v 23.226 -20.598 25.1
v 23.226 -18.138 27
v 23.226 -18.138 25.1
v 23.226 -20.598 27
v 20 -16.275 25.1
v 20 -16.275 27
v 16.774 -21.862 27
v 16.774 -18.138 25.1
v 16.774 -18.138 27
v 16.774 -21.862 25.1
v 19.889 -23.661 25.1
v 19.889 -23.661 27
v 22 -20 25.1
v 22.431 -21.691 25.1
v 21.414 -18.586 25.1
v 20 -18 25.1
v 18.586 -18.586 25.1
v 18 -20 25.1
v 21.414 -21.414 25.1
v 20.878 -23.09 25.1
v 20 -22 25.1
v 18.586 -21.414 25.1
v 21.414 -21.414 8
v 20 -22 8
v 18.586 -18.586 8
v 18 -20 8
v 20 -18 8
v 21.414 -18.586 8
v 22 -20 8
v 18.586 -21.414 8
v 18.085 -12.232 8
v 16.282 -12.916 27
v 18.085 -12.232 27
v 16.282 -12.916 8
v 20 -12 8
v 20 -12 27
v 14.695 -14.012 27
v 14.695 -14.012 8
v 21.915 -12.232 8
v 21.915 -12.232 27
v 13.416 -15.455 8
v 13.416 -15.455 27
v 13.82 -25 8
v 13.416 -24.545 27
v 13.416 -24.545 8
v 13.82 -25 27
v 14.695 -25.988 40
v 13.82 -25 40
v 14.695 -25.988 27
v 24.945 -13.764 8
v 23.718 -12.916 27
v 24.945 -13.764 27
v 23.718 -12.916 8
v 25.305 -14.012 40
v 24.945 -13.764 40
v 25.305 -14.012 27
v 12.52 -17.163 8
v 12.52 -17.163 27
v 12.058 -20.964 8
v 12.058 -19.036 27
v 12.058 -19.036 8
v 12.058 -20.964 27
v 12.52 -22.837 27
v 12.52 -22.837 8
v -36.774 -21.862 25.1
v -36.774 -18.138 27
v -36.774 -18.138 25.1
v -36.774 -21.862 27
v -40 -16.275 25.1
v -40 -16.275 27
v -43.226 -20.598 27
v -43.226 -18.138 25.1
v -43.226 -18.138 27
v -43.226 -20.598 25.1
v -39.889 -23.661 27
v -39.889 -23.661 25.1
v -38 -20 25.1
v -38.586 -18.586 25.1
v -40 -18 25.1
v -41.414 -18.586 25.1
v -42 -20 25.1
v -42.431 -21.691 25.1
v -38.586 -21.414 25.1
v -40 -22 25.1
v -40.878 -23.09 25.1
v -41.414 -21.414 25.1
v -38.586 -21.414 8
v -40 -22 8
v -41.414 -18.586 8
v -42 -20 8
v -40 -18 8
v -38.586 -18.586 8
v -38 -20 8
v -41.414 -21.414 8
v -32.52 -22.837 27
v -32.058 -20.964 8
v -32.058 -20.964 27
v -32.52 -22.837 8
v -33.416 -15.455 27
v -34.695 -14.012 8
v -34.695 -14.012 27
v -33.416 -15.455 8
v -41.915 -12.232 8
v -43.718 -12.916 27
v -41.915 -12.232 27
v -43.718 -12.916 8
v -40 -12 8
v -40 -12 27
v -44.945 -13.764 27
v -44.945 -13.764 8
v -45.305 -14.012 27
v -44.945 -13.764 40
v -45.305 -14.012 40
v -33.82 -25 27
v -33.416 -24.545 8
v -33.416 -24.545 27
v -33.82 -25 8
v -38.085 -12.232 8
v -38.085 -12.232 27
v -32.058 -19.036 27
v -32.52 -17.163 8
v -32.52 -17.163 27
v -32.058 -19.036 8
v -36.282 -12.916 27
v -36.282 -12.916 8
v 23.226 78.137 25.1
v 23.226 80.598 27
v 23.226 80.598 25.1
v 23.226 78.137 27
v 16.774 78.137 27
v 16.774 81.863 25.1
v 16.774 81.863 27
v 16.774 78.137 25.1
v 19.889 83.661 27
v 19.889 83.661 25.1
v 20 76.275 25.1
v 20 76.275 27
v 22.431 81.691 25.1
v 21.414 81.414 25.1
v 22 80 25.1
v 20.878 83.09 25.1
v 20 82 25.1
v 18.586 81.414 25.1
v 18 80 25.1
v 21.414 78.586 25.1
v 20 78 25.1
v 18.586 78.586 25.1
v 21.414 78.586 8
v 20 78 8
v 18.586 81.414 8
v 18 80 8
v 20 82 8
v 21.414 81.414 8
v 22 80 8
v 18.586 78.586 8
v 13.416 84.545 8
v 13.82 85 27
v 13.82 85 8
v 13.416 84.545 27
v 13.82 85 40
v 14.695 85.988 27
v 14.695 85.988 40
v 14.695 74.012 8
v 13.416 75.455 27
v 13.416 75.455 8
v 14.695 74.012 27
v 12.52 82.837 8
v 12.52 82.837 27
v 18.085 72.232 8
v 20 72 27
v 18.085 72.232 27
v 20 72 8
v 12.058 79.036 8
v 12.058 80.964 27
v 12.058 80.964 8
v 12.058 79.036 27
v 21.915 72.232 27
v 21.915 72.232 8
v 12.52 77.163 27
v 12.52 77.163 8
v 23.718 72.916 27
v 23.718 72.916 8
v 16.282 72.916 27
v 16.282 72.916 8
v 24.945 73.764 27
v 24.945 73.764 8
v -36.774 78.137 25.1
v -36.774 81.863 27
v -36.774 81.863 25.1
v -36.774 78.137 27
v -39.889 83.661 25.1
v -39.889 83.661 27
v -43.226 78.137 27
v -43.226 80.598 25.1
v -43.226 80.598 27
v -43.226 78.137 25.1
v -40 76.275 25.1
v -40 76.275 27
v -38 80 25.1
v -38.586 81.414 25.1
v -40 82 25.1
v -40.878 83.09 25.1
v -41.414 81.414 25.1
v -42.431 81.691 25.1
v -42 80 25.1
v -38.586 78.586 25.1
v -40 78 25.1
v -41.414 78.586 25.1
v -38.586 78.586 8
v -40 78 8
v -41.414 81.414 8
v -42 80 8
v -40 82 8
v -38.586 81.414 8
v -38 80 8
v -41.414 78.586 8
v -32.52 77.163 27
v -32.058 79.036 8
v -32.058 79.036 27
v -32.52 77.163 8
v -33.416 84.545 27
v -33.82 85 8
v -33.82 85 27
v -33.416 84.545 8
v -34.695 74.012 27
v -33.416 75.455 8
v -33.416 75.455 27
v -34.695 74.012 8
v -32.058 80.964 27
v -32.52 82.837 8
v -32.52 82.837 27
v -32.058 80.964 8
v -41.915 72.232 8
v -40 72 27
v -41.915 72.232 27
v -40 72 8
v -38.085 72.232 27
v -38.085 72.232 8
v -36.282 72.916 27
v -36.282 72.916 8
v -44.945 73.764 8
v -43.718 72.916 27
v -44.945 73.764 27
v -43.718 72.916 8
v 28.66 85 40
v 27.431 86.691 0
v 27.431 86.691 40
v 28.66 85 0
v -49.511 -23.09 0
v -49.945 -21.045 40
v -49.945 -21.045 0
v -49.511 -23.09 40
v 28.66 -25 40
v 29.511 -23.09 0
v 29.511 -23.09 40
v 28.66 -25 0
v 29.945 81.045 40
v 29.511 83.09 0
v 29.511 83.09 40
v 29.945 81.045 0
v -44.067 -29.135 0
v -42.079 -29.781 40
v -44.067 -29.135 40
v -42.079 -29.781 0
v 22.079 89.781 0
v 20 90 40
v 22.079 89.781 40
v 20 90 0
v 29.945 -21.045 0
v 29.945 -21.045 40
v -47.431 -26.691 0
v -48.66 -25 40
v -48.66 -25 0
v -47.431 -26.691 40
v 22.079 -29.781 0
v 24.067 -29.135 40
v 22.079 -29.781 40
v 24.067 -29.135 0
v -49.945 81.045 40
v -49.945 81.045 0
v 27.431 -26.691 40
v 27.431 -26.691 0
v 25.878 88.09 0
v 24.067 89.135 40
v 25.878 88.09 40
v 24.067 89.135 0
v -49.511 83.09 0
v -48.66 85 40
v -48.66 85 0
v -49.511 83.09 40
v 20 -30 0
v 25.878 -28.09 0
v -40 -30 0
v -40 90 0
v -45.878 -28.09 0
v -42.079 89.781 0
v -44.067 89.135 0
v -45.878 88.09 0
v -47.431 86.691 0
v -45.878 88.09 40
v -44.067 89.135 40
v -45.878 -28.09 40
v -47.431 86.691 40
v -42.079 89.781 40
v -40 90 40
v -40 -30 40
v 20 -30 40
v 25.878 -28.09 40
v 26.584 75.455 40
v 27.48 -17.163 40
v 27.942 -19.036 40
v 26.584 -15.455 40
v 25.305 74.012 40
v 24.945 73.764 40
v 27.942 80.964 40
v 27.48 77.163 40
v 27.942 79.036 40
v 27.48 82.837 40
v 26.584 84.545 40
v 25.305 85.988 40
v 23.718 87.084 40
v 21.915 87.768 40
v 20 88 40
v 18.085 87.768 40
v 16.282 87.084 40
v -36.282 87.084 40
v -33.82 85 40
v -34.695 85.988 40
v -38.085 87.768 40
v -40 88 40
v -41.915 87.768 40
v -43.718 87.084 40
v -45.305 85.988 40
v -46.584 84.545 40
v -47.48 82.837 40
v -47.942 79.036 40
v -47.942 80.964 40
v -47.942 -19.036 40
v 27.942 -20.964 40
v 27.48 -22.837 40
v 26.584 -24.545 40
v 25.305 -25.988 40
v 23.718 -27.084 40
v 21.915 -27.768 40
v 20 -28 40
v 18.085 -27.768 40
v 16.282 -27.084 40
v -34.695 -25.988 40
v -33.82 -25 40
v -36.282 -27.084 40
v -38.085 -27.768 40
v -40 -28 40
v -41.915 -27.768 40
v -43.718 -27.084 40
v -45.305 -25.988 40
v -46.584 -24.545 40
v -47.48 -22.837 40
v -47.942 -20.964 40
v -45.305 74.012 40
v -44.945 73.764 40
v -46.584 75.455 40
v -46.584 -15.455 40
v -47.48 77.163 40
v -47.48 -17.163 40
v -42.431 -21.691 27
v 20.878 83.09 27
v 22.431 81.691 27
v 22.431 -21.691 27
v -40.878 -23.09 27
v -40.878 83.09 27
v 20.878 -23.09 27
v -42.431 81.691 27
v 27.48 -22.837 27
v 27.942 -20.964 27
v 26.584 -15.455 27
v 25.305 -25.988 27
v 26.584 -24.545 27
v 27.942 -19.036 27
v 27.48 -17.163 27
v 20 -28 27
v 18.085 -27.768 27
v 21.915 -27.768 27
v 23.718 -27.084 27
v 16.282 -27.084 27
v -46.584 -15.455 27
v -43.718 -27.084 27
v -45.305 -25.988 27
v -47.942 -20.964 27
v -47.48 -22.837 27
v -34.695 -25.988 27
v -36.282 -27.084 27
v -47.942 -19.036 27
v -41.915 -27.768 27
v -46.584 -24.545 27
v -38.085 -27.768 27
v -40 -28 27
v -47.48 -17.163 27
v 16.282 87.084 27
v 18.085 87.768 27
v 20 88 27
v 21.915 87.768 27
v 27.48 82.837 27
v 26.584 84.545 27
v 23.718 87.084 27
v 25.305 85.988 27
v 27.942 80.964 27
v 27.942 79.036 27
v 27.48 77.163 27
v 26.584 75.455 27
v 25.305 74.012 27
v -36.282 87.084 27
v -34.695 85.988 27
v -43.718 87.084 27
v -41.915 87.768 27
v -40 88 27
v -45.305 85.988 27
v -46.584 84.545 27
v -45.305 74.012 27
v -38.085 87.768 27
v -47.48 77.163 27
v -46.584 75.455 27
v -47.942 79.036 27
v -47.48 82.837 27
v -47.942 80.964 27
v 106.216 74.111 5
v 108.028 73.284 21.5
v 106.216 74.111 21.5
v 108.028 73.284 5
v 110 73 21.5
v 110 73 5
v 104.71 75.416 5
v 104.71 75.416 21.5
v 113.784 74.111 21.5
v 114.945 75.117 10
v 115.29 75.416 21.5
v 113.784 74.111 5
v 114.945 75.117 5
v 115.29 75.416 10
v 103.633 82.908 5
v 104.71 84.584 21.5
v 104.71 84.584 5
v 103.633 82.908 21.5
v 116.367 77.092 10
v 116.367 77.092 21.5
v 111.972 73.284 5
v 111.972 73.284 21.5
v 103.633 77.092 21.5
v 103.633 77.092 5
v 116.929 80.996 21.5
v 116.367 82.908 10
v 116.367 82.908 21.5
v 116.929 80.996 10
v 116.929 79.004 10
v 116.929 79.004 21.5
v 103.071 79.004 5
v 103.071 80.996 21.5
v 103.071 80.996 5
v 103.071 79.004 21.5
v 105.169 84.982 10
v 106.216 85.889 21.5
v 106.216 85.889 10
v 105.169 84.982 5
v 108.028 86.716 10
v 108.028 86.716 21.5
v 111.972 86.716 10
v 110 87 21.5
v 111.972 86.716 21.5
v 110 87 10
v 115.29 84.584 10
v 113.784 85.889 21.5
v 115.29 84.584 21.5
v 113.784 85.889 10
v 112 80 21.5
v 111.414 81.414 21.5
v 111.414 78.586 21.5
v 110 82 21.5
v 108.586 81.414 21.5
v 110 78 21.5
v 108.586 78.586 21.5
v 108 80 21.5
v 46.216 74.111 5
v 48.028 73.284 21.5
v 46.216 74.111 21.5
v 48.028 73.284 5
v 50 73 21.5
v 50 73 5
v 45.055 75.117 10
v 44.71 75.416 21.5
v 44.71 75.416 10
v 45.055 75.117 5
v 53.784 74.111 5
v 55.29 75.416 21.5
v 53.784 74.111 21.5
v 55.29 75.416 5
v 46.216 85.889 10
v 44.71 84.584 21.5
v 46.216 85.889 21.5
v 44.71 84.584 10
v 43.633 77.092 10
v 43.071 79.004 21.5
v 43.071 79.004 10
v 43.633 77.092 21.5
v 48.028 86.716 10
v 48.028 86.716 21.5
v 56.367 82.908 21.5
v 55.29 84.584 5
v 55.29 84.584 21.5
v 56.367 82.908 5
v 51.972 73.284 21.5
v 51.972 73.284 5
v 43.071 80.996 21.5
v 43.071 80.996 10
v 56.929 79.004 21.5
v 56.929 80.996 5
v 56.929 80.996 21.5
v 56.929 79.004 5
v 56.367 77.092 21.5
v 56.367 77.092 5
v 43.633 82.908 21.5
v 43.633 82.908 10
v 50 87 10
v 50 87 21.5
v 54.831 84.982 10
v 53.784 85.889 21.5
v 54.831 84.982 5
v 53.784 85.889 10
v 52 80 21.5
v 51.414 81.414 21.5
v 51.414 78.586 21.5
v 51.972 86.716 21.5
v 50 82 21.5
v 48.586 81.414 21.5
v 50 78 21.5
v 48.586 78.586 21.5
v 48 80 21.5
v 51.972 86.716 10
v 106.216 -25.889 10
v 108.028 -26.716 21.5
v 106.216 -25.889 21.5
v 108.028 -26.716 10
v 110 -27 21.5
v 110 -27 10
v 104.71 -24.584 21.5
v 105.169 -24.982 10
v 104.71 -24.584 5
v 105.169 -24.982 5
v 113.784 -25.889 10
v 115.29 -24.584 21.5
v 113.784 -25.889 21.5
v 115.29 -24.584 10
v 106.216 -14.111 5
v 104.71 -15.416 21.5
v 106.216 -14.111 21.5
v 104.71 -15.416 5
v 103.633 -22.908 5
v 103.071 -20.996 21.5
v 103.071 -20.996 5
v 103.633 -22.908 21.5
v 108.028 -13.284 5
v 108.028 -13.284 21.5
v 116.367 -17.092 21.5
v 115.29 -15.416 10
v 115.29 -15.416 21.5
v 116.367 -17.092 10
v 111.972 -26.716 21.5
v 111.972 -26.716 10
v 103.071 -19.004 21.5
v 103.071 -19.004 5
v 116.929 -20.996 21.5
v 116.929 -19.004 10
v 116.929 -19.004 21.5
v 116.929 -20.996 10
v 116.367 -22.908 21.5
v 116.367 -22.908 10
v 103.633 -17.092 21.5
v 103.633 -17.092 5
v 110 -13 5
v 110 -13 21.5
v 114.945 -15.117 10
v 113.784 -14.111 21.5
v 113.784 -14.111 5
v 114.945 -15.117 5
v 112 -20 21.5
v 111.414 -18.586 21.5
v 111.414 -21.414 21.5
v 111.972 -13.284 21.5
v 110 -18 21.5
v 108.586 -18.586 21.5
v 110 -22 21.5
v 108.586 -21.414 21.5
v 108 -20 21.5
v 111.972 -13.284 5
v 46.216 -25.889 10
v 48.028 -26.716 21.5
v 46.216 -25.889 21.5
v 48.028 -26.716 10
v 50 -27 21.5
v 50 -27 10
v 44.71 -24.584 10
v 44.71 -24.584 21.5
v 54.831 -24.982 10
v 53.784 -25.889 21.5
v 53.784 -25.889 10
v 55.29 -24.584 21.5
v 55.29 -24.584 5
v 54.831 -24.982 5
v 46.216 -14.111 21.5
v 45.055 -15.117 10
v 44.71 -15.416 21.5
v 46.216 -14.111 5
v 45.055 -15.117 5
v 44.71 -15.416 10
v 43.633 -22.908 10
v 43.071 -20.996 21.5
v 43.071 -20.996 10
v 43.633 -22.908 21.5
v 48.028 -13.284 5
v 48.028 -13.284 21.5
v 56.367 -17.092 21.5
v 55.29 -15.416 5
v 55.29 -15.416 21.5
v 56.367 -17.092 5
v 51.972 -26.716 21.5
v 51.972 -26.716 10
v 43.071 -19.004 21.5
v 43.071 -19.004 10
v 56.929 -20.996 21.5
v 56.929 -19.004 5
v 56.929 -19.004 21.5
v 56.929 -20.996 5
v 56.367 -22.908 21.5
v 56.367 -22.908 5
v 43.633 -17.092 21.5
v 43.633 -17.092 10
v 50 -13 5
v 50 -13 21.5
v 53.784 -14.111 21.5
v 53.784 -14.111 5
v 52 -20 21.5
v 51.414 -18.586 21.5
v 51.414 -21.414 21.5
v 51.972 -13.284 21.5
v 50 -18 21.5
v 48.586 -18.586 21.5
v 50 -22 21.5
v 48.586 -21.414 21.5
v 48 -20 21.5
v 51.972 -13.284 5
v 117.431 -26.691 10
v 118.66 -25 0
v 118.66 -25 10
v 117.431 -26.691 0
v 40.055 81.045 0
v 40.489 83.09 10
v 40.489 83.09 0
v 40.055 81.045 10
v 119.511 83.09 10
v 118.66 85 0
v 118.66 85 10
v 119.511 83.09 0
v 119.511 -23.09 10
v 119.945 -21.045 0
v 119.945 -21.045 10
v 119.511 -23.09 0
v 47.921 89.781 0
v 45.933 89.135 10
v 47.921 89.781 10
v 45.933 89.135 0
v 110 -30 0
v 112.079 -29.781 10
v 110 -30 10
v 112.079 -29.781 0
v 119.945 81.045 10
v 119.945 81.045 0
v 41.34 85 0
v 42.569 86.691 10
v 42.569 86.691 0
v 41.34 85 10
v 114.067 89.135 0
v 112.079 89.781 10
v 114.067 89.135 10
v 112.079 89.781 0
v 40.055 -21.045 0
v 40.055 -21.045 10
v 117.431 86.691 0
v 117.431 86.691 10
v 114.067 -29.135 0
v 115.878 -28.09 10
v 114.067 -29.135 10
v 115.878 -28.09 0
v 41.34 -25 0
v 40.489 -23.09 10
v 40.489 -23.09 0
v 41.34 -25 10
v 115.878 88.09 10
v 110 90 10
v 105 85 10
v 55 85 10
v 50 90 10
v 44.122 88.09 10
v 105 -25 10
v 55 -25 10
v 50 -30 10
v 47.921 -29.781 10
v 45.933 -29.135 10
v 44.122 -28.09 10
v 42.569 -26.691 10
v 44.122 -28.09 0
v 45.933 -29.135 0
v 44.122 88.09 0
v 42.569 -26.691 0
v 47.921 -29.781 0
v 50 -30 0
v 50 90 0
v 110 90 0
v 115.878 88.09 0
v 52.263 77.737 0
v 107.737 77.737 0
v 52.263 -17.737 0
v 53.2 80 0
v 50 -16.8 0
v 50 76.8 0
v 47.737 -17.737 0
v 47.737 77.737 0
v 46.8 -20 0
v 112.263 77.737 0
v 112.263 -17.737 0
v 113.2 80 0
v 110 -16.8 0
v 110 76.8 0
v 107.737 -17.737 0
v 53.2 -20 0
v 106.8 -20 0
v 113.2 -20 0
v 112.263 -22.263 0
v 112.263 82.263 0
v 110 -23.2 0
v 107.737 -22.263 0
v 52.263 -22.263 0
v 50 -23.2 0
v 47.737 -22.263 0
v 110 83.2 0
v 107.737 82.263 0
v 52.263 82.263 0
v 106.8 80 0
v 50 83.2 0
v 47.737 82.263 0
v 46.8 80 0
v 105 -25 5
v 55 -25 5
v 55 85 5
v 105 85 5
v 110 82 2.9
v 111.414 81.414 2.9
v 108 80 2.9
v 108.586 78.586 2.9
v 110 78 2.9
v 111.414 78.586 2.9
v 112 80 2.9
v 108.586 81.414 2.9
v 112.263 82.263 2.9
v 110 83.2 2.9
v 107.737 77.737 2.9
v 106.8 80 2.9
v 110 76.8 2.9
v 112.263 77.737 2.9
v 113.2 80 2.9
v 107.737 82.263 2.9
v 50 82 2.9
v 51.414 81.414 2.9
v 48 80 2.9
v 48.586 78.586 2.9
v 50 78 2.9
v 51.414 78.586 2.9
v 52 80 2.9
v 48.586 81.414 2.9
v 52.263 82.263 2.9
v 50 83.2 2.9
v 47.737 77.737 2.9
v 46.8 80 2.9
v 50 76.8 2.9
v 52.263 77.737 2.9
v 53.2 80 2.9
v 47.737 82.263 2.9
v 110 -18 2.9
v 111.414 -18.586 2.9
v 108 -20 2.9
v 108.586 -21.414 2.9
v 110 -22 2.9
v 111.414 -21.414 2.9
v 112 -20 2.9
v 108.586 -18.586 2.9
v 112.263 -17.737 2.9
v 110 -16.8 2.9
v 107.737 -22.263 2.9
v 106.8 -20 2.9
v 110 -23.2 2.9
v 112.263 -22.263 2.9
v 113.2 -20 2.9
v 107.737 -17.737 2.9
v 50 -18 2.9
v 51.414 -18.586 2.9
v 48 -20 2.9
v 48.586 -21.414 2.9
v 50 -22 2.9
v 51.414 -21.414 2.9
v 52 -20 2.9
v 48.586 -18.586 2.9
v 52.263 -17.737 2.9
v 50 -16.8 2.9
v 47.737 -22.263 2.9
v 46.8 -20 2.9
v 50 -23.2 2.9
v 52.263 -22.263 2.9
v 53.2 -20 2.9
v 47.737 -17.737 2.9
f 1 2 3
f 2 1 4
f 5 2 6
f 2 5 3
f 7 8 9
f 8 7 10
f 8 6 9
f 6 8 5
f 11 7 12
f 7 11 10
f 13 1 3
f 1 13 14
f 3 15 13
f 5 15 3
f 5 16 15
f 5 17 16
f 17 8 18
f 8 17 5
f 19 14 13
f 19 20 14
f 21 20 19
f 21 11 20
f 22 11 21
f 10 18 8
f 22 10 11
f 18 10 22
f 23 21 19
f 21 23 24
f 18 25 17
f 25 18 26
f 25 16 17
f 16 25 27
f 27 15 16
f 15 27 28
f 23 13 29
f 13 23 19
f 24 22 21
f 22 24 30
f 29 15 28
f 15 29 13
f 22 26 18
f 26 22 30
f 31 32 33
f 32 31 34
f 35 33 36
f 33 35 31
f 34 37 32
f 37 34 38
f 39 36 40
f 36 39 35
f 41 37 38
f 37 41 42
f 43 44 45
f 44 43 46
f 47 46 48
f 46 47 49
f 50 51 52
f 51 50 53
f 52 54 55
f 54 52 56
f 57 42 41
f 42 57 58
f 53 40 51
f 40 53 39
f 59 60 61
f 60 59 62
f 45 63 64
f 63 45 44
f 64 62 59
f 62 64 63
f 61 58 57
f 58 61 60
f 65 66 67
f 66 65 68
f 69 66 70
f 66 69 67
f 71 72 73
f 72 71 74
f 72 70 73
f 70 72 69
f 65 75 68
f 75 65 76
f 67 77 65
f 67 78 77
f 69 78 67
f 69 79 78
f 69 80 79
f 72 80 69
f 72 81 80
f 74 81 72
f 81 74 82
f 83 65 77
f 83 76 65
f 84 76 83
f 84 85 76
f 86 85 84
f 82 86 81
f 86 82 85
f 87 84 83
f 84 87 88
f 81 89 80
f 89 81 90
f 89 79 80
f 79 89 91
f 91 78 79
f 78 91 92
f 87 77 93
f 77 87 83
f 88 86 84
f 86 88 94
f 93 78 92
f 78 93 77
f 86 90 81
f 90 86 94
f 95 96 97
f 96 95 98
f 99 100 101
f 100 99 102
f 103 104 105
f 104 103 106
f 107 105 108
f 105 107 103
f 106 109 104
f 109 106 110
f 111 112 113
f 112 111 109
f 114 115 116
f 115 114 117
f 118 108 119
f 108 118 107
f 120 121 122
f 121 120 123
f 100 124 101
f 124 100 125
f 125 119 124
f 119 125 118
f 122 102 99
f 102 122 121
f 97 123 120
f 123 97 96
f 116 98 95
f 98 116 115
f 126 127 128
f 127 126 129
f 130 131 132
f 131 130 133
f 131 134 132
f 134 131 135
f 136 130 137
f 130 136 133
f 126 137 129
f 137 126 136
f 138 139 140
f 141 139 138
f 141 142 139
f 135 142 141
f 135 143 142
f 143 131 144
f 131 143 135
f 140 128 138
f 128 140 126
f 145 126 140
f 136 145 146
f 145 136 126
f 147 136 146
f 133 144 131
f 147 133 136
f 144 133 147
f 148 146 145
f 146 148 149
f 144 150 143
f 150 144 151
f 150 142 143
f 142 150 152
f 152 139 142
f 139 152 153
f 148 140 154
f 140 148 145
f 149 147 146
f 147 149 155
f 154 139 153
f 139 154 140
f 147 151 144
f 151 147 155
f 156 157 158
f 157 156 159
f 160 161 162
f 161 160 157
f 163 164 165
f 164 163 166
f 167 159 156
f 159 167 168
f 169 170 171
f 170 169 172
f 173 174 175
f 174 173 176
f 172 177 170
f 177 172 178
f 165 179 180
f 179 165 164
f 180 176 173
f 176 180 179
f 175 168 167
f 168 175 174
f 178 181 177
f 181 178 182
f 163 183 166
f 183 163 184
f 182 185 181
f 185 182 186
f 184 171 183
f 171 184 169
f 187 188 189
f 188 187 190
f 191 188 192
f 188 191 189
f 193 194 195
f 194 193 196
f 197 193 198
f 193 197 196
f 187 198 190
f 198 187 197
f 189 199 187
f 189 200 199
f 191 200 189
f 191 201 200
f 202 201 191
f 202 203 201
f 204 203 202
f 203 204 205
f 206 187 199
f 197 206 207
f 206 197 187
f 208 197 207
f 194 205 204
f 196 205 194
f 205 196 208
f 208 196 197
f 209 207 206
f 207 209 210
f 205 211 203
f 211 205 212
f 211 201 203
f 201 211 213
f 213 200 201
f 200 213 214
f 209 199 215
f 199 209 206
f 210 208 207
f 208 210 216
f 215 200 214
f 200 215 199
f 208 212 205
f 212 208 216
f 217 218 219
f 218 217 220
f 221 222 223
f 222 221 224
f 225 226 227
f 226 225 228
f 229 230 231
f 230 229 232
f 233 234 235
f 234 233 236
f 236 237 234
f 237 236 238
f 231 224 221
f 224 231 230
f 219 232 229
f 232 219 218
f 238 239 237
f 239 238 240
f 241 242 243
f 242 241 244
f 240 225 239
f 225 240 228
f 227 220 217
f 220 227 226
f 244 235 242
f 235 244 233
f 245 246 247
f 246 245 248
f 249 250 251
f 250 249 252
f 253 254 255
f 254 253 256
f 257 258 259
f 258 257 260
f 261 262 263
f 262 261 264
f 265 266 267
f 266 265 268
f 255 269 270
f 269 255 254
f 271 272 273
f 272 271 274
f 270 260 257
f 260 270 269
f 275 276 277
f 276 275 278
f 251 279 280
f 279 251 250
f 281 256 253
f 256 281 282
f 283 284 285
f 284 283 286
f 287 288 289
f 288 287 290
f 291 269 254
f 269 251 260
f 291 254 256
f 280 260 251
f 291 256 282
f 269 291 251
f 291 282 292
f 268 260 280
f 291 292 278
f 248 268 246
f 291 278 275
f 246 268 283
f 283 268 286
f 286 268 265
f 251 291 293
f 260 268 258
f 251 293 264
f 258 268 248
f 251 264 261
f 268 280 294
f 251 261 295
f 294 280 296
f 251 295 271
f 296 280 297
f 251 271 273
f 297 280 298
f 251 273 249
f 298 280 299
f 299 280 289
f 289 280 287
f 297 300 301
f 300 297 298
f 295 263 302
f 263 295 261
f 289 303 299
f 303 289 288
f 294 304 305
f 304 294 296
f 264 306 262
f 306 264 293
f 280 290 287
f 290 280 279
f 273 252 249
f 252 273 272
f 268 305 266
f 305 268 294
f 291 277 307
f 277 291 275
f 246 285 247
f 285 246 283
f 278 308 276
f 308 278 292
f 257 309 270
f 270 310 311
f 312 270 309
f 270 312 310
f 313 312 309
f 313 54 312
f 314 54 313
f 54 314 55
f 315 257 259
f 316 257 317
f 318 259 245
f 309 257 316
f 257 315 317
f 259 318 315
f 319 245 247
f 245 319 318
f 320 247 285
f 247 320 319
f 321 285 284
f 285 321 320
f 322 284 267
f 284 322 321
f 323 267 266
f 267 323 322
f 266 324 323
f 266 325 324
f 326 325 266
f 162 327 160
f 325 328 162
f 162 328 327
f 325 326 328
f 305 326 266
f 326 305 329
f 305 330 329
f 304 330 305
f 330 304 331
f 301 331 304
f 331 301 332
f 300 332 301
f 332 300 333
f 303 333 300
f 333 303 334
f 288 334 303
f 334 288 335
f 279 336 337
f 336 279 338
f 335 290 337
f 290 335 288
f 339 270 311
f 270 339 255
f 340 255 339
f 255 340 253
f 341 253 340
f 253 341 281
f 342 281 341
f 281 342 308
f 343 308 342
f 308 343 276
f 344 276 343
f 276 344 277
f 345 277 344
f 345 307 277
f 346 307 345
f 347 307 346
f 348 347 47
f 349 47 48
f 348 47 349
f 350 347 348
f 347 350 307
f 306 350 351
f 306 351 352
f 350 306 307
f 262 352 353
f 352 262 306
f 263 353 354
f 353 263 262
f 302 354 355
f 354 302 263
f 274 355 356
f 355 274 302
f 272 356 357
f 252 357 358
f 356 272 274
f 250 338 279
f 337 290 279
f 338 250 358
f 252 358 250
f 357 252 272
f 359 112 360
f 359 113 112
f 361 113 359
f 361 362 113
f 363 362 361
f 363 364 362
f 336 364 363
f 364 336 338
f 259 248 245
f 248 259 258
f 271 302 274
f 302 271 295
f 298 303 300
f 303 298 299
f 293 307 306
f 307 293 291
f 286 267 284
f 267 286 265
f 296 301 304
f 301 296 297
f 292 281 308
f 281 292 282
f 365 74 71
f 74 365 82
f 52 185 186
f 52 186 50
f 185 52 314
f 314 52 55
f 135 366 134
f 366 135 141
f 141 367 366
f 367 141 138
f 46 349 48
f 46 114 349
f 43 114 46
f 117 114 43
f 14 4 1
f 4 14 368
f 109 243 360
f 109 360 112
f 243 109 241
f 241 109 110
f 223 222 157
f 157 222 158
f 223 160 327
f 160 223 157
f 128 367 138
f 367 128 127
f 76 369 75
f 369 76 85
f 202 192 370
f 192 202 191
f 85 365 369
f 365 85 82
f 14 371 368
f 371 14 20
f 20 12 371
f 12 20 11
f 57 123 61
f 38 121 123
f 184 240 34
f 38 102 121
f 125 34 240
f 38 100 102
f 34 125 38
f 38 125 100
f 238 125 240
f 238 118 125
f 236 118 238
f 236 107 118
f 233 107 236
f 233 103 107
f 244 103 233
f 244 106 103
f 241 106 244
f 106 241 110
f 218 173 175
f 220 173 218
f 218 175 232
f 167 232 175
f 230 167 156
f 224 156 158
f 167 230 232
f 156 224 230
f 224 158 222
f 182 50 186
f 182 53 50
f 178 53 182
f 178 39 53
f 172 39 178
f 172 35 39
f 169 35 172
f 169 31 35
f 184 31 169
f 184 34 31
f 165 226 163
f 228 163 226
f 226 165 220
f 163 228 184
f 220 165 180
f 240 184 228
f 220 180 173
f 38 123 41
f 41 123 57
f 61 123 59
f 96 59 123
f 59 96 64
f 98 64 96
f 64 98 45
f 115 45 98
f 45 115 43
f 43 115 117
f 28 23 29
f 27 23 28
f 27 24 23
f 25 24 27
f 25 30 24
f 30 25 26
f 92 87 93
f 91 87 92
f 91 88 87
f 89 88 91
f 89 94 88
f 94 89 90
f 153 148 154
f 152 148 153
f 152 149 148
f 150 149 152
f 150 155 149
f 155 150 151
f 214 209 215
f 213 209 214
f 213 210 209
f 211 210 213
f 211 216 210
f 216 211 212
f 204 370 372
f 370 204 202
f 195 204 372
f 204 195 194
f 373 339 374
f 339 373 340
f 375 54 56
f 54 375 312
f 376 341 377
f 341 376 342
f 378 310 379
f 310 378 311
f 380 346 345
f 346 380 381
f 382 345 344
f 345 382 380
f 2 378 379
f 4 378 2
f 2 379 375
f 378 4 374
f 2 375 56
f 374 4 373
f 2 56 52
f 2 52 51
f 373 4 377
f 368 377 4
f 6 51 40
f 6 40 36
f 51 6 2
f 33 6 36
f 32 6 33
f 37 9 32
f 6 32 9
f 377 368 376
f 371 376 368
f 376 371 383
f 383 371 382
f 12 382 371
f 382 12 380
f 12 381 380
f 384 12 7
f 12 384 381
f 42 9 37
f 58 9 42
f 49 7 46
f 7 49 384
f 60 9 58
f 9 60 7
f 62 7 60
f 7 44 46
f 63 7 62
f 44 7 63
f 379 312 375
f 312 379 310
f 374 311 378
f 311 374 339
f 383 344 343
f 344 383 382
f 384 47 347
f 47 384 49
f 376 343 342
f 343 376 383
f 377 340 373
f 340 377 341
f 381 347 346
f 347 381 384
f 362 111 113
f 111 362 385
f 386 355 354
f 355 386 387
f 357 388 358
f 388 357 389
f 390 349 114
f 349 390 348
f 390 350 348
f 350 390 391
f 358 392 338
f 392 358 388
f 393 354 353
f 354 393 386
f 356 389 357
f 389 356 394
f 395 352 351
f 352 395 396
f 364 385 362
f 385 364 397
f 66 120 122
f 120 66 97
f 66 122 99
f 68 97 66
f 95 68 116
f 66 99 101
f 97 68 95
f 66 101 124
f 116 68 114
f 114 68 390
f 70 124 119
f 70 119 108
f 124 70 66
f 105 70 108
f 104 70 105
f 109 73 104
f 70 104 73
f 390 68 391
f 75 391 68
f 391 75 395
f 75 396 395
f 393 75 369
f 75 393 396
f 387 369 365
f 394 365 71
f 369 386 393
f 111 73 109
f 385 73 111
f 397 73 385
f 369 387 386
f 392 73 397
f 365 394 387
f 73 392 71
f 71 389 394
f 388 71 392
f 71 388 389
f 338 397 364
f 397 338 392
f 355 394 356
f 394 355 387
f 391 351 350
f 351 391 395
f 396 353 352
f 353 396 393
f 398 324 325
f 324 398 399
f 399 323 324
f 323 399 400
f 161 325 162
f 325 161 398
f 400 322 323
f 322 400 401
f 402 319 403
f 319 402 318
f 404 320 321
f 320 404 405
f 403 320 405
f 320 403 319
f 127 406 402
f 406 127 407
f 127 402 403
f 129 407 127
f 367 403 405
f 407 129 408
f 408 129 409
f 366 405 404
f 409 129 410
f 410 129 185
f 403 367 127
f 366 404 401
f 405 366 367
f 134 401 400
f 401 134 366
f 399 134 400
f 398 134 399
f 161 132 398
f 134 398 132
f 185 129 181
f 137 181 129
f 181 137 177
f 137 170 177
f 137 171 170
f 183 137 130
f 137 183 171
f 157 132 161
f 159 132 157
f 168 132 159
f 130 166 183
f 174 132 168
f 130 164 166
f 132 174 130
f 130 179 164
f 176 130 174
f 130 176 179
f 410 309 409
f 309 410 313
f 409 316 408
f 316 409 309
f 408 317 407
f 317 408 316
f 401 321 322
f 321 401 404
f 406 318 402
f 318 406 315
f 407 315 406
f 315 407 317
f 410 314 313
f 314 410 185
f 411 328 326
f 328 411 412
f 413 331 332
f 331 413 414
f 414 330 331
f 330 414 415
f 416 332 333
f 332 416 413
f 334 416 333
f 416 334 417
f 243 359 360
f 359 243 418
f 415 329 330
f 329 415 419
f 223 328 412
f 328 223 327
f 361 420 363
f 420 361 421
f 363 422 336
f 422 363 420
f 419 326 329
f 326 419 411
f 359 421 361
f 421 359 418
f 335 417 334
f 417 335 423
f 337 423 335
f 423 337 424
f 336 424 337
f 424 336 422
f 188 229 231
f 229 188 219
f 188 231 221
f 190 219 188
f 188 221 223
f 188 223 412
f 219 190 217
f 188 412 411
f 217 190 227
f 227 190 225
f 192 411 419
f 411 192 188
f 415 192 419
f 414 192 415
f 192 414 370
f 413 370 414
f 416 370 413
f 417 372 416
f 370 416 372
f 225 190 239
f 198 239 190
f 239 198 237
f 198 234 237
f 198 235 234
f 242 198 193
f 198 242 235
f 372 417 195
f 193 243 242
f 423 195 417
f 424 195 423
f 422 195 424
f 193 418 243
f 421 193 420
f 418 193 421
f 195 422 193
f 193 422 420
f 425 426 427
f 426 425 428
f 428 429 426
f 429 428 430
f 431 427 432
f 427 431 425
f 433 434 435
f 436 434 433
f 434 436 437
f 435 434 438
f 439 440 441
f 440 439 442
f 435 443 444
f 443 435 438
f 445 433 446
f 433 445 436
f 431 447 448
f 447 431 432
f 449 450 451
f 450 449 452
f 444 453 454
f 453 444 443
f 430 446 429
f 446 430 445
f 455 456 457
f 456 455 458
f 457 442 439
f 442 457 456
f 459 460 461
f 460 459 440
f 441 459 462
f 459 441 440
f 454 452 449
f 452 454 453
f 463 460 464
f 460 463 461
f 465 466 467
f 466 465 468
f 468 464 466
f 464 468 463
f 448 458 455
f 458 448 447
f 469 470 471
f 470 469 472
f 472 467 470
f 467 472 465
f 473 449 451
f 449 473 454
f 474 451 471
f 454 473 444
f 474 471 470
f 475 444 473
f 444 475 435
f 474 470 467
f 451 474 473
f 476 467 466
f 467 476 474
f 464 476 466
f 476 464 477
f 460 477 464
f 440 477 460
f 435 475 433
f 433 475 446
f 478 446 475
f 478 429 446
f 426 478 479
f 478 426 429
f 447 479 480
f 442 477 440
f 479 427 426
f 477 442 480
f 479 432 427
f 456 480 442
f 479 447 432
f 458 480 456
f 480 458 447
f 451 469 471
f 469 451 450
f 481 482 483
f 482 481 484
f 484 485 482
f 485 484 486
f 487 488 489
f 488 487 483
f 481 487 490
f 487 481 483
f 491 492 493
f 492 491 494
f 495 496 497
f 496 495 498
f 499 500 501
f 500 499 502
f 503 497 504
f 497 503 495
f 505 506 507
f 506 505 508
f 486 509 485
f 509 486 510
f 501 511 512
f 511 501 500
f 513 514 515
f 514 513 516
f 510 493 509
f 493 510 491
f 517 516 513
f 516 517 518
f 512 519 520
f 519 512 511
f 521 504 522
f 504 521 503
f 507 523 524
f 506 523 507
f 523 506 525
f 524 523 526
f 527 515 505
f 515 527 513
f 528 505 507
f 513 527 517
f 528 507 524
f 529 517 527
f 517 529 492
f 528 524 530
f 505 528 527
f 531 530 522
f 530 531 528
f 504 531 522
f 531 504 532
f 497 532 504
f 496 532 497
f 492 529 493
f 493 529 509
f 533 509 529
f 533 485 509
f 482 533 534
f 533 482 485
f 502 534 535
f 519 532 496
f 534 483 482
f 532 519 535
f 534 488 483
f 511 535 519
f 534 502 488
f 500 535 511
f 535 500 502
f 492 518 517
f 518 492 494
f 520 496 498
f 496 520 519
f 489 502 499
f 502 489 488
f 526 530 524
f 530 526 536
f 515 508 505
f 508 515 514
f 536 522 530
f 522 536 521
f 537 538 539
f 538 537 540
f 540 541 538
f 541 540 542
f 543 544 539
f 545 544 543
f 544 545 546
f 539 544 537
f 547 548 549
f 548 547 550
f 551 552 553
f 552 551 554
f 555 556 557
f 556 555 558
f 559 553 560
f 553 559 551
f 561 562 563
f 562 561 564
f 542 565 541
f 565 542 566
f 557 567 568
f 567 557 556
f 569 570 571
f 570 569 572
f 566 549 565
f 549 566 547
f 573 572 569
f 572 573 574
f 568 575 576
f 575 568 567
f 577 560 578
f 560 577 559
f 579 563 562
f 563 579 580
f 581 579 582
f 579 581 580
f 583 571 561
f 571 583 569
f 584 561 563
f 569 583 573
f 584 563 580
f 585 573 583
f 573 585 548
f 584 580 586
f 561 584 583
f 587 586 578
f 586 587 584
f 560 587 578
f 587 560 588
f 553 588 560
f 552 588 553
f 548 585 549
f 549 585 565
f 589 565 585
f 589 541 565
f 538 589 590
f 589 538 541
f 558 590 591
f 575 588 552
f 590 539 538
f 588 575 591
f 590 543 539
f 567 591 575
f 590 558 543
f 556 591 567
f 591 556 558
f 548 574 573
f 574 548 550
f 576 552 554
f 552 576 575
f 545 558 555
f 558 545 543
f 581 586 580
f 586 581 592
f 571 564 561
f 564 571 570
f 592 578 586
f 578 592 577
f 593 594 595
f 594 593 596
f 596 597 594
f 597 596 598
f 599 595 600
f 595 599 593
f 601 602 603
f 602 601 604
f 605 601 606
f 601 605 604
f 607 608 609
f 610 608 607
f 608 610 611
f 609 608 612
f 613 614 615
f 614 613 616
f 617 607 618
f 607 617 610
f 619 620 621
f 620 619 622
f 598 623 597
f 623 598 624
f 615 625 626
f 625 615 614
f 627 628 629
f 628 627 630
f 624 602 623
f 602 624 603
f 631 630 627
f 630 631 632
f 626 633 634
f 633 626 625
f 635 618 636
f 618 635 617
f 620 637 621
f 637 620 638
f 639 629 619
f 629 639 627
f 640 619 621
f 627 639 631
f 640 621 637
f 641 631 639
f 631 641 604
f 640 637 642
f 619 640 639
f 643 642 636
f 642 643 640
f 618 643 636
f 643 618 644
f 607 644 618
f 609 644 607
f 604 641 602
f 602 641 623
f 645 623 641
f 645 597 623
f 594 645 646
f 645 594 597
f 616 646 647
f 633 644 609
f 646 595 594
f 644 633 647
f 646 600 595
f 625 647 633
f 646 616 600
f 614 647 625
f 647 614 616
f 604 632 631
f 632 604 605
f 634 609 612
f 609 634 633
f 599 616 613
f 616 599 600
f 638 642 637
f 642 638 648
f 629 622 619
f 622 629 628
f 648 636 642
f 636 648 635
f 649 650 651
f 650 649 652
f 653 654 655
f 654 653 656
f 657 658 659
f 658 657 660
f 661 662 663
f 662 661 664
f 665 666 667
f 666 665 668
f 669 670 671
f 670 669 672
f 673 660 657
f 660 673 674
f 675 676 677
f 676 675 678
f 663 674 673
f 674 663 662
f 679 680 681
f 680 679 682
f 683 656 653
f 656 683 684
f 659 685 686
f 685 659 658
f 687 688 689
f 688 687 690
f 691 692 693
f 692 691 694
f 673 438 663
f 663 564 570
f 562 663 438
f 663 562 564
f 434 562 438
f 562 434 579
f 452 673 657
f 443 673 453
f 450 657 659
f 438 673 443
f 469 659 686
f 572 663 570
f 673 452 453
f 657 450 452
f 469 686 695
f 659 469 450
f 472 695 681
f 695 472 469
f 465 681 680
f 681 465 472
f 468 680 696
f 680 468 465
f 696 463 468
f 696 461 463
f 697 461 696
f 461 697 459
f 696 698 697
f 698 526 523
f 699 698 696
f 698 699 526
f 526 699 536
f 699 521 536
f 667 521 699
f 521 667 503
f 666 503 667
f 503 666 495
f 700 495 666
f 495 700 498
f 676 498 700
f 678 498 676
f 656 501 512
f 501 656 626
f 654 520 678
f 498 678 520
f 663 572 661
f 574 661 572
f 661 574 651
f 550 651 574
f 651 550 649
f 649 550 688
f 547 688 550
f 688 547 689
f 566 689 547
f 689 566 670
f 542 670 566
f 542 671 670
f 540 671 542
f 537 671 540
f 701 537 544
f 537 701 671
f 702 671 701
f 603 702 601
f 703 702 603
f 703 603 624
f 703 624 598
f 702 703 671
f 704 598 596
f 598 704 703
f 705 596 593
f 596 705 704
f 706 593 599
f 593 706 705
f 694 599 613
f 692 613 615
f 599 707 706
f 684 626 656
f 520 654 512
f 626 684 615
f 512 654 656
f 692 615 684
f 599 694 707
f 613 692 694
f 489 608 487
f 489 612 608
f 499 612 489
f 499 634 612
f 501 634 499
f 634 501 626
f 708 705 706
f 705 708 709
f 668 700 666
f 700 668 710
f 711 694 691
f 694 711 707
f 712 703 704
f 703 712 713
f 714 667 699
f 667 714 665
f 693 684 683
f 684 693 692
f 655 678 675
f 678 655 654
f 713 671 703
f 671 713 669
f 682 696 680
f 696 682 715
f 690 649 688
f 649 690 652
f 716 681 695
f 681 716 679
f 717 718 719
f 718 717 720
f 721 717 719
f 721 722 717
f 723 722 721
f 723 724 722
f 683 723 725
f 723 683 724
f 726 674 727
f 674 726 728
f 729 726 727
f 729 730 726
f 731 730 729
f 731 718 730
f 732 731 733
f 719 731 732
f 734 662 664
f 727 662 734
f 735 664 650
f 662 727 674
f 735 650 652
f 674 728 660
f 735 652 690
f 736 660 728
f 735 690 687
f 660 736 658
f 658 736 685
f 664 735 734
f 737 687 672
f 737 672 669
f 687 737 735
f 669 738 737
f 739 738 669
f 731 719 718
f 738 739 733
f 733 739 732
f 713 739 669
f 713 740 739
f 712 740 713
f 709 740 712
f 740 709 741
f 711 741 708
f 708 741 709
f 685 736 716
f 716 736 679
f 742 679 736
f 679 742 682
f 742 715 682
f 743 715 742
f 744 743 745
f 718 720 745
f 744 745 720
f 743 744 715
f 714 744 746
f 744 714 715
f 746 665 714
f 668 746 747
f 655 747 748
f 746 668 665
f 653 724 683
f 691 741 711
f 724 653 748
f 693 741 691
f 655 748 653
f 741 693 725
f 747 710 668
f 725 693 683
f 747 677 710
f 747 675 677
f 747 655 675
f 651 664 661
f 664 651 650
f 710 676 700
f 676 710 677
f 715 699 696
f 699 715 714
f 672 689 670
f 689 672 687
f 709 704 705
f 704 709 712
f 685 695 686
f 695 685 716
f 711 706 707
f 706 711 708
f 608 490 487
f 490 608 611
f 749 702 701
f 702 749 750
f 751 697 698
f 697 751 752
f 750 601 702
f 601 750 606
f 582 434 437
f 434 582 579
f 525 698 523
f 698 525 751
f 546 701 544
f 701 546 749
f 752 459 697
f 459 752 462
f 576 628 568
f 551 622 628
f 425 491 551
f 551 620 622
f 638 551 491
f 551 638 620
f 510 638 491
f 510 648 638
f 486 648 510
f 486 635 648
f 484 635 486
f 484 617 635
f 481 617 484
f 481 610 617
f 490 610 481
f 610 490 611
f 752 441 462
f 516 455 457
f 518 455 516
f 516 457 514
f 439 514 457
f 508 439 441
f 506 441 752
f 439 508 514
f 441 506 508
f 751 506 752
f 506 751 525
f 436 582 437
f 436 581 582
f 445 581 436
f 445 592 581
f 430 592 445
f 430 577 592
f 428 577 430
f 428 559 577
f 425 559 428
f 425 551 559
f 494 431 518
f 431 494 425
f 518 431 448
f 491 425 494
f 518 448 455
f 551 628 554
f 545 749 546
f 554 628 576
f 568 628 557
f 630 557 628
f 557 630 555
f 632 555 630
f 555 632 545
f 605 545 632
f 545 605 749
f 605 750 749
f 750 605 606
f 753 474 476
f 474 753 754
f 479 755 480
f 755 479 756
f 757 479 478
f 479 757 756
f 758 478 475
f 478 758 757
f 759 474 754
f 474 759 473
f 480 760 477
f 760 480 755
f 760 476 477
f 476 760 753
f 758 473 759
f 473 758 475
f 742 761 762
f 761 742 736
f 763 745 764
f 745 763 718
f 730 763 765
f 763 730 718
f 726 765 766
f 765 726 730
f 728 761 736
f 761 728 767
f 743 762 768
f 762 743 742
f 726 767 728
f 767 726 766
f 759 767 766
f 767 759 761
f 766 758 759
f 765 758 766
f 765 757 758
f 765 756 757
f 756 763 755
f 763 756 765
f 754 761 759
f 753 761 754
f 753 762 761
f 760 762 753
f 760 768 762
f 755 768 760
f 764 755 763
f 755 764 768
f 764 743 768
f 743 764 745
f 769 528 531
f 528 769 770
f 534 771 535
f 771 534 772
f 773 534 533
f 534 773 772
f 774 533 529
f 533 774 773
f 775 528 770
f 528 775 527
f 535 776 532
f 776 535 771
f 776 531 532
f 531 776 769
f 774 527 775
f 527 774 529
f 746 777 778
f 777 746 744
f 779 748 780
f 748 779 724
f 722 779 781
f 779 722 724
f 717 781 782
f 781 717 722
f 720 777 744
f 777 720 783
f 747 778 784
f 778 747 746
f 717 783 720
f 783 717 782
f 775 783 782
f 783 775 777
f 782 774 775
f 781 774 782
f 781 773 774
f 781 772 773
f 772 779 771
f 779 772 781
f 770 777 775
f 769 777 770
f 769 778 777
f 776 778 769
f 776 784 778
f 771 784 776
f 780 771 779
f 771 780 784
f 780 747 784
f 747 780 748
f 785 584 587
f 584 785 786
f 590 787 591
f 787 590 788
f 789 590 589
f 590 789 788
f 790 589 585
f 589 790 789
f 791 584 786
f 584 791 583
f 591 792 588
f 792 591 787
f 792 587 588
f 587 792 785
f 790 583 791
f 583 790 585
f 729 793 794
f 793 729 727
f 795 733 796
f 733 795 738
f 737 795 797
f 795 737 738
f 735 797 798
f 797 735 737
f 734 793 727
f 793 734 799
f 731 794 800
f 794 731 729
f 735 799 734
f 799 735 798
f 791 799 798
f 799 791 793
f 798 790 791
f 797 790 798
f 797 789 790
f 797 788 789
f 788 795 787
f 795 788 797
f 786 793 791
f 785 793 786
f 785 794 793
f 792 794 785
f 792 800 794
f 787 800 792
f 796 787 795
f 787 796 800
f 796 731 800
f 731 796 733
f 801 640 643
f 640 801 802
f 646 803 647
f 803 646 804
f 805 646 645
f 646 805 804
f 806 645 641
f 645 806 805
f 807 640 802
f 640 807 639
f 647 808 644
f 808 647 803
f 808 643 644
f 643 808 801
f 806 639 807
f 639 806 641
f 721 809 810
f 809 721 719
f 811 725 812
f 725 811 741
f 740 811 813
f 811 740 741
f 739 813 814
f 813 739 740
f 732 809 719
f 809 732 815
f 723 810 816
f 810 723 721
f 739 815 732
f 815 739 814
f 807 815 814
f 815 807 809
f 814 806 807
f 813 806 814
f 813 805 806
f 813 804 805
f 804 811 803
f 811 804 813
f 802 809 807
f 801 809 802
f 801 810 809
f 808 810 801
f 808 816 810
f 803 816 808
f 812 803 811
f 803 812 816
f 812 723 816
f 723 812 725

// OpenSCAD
separation=35;
n_faces=8;

box_x=100; 		//default = 100
box_y=60;  		//default = 60
box_z=40;  		//default = 40

lid_z=10; 		//default = 10
lid_tol=1; 		//tolerance

box_wall=5; 	//default = 5

pillar_z=25;	//default = 25
pillar_r=8;		//default = 8

3Dprintflag=1;
basebox_tr = 3Dprintflag ? [0,0,0] : [0,0,0];
basebox_rot = 3Dprintflag ? [0,0,90] : [0,0,0];

lid_tr = 3Dprintflag ? [110,box_y+20,box_wall*2] : [-20,-20,50];
lid_rot = 3Dprintflag ? [0,180,90] : [0,0,0];



// Box
translate(basebox_tr){rotate(basebox_rot){base_box();}}

// Lid
translate(lid_tr){rotate(lid_rot){lid();}}



module base_box() {
	difference() {
		base_box_rim();
		union() {
			translate([-20, -20, pillar_z+9.9]) {lid_pillars2();}
		}
	}
}

module lid() {
	difference() {
		union(){
				lid_rim();
				lid_pillars();
			}
			lid_screws();
	}
	// #lid_screws();
}

module lid_pillars() {
	//Pillars for screws
	union() {
		for (i=[0:1]) {
			for (j=[0:1]) {
				translate([box_x*i, box_y*j, -2]) {
						cylinder(r=pillar_r-lid_tol, h=box_wall+box_z-pillar_z-lid_tol, center=true);
				}
			}
		}
	}
}

module lid_pillars2() {
	//Pillars for base box without tolerance modification
	union() {
		for (i=[0:1]) {
			for (j=[0:1]) {
				translate([box_x*i, box_y*j, -.4]) {
						cylinder(r=pillar_r, h=box_z-pillar_z, center=true);
				}
			}
		}
	}
}

module lid_screws(){
	union() {
		for (i=[0:1]) {
			for (j=[0:1]) {
				translate([box_x*i, box_y*j, 10.1]) {
						screw();
				}
			}
		}
	}
}

module lid_rim(){
	lid_pillars();
	
	 difference() {
		//Outer shell
		hull() {
			translate([0, 0, 5]) {
				for (i=[0:1]) {
					for (j=[0:1]) {
						translate([box_x*i, box_y*j, 0]) {
							cylinder(r=10, h=lid_z, center=true);
						}
					}
				}
			}
		}
		//Inner shell	
		hull() {
				translate([box_wall,box_wall,0]) {
					cylinder(r=10, h=lid_z, center=true);}
				translate([box_x-box_wall,box_wall,0]) {
					cylinder(r=10, h=lid_z, center=true);}
				translate([box_wall,box_y-box_wall,0]) {
					cylinder(r=10, h=lid_z, center=true);}
				translate([box_x-box_wall,box_y-box_wall,0]) {
					cylinder(r=10, h=lid_z, center=true);}
			}
	}
}


module base_box_rim(){
	//Pillars for screws
	translate([-20, -20, 15]) {
		for (i=[0:1]) {
			for (j=[0:1]) {
				translate([box_x*i, box_y*j, 0]) {
					difference(){
						cylinder(r=pillar_r, h=pillar_z, center=true);
						union() {
							translate([0, 0, pillar_z-9.9]) {nut();}
							translate([0, 0, -10]) {cylinder(r=1.5+.5, h=27.80,$fn=n_faces);}
						}
					}
				}
			}
		}
	}
	
	
	difference() {
		//Outer shell
		hull() {
			translate([-20, -20, 20]) {
				for (i=[0:1]) {
					for (j=[0:1]) {
						translate([box_x*i, box_y*j, 0]) {
							cylinder(r=10, h=box_z, center=true);
						}
					}
				}
			}
		}
		//Inner shell	
		hull() {
			translate([-20, -20, 28]) {
				translate([box_wall,box_wall,0]) {
					cylinder(r=10, h=box_z, center=true);}
				translate([box_x-box_wall,box_wall,0]) {
					cylinder(r=10, h=box_z, center=true);}
				translate([box_wall,box_y-box_wall,0]) {
					cylinder(r=10, h=box_z, center=true);}
				translate([box_x-box_wall,box_y-box_wall,0]) {
					cylinder(r=10, h=box_z, center=true);}
			}
		}
	}
}



module screw() {
	mirror([0,0,1]) {
		union() {
			cylinder(r=1.5+.5, h=27.80,$fn=n_faces);
			cylinder(r=5.4/2+.5, h=3.00,$fn=n_faces);
		}
	}
}
module nut() {
	//nut_h=3; //Real
	nut_h=5; //Making Hole deeper
	translate([0, 0, -nut_h]) {
		cylinder(r=5.45/2+1, h=nut_h,$fn=6);
	}	
}
	
module screw2(nutz) {
	mirror([0,0,1]) {
		union() {
			cylinder(r=1.5+.5, h=27.80,$fn=n_faces);
			cylinder(r=5.4/2+.5, h=3.00,$fn=n_faces);
		}
		translate([0, 0, nutz]) {nut();}
	}
}
	

	
